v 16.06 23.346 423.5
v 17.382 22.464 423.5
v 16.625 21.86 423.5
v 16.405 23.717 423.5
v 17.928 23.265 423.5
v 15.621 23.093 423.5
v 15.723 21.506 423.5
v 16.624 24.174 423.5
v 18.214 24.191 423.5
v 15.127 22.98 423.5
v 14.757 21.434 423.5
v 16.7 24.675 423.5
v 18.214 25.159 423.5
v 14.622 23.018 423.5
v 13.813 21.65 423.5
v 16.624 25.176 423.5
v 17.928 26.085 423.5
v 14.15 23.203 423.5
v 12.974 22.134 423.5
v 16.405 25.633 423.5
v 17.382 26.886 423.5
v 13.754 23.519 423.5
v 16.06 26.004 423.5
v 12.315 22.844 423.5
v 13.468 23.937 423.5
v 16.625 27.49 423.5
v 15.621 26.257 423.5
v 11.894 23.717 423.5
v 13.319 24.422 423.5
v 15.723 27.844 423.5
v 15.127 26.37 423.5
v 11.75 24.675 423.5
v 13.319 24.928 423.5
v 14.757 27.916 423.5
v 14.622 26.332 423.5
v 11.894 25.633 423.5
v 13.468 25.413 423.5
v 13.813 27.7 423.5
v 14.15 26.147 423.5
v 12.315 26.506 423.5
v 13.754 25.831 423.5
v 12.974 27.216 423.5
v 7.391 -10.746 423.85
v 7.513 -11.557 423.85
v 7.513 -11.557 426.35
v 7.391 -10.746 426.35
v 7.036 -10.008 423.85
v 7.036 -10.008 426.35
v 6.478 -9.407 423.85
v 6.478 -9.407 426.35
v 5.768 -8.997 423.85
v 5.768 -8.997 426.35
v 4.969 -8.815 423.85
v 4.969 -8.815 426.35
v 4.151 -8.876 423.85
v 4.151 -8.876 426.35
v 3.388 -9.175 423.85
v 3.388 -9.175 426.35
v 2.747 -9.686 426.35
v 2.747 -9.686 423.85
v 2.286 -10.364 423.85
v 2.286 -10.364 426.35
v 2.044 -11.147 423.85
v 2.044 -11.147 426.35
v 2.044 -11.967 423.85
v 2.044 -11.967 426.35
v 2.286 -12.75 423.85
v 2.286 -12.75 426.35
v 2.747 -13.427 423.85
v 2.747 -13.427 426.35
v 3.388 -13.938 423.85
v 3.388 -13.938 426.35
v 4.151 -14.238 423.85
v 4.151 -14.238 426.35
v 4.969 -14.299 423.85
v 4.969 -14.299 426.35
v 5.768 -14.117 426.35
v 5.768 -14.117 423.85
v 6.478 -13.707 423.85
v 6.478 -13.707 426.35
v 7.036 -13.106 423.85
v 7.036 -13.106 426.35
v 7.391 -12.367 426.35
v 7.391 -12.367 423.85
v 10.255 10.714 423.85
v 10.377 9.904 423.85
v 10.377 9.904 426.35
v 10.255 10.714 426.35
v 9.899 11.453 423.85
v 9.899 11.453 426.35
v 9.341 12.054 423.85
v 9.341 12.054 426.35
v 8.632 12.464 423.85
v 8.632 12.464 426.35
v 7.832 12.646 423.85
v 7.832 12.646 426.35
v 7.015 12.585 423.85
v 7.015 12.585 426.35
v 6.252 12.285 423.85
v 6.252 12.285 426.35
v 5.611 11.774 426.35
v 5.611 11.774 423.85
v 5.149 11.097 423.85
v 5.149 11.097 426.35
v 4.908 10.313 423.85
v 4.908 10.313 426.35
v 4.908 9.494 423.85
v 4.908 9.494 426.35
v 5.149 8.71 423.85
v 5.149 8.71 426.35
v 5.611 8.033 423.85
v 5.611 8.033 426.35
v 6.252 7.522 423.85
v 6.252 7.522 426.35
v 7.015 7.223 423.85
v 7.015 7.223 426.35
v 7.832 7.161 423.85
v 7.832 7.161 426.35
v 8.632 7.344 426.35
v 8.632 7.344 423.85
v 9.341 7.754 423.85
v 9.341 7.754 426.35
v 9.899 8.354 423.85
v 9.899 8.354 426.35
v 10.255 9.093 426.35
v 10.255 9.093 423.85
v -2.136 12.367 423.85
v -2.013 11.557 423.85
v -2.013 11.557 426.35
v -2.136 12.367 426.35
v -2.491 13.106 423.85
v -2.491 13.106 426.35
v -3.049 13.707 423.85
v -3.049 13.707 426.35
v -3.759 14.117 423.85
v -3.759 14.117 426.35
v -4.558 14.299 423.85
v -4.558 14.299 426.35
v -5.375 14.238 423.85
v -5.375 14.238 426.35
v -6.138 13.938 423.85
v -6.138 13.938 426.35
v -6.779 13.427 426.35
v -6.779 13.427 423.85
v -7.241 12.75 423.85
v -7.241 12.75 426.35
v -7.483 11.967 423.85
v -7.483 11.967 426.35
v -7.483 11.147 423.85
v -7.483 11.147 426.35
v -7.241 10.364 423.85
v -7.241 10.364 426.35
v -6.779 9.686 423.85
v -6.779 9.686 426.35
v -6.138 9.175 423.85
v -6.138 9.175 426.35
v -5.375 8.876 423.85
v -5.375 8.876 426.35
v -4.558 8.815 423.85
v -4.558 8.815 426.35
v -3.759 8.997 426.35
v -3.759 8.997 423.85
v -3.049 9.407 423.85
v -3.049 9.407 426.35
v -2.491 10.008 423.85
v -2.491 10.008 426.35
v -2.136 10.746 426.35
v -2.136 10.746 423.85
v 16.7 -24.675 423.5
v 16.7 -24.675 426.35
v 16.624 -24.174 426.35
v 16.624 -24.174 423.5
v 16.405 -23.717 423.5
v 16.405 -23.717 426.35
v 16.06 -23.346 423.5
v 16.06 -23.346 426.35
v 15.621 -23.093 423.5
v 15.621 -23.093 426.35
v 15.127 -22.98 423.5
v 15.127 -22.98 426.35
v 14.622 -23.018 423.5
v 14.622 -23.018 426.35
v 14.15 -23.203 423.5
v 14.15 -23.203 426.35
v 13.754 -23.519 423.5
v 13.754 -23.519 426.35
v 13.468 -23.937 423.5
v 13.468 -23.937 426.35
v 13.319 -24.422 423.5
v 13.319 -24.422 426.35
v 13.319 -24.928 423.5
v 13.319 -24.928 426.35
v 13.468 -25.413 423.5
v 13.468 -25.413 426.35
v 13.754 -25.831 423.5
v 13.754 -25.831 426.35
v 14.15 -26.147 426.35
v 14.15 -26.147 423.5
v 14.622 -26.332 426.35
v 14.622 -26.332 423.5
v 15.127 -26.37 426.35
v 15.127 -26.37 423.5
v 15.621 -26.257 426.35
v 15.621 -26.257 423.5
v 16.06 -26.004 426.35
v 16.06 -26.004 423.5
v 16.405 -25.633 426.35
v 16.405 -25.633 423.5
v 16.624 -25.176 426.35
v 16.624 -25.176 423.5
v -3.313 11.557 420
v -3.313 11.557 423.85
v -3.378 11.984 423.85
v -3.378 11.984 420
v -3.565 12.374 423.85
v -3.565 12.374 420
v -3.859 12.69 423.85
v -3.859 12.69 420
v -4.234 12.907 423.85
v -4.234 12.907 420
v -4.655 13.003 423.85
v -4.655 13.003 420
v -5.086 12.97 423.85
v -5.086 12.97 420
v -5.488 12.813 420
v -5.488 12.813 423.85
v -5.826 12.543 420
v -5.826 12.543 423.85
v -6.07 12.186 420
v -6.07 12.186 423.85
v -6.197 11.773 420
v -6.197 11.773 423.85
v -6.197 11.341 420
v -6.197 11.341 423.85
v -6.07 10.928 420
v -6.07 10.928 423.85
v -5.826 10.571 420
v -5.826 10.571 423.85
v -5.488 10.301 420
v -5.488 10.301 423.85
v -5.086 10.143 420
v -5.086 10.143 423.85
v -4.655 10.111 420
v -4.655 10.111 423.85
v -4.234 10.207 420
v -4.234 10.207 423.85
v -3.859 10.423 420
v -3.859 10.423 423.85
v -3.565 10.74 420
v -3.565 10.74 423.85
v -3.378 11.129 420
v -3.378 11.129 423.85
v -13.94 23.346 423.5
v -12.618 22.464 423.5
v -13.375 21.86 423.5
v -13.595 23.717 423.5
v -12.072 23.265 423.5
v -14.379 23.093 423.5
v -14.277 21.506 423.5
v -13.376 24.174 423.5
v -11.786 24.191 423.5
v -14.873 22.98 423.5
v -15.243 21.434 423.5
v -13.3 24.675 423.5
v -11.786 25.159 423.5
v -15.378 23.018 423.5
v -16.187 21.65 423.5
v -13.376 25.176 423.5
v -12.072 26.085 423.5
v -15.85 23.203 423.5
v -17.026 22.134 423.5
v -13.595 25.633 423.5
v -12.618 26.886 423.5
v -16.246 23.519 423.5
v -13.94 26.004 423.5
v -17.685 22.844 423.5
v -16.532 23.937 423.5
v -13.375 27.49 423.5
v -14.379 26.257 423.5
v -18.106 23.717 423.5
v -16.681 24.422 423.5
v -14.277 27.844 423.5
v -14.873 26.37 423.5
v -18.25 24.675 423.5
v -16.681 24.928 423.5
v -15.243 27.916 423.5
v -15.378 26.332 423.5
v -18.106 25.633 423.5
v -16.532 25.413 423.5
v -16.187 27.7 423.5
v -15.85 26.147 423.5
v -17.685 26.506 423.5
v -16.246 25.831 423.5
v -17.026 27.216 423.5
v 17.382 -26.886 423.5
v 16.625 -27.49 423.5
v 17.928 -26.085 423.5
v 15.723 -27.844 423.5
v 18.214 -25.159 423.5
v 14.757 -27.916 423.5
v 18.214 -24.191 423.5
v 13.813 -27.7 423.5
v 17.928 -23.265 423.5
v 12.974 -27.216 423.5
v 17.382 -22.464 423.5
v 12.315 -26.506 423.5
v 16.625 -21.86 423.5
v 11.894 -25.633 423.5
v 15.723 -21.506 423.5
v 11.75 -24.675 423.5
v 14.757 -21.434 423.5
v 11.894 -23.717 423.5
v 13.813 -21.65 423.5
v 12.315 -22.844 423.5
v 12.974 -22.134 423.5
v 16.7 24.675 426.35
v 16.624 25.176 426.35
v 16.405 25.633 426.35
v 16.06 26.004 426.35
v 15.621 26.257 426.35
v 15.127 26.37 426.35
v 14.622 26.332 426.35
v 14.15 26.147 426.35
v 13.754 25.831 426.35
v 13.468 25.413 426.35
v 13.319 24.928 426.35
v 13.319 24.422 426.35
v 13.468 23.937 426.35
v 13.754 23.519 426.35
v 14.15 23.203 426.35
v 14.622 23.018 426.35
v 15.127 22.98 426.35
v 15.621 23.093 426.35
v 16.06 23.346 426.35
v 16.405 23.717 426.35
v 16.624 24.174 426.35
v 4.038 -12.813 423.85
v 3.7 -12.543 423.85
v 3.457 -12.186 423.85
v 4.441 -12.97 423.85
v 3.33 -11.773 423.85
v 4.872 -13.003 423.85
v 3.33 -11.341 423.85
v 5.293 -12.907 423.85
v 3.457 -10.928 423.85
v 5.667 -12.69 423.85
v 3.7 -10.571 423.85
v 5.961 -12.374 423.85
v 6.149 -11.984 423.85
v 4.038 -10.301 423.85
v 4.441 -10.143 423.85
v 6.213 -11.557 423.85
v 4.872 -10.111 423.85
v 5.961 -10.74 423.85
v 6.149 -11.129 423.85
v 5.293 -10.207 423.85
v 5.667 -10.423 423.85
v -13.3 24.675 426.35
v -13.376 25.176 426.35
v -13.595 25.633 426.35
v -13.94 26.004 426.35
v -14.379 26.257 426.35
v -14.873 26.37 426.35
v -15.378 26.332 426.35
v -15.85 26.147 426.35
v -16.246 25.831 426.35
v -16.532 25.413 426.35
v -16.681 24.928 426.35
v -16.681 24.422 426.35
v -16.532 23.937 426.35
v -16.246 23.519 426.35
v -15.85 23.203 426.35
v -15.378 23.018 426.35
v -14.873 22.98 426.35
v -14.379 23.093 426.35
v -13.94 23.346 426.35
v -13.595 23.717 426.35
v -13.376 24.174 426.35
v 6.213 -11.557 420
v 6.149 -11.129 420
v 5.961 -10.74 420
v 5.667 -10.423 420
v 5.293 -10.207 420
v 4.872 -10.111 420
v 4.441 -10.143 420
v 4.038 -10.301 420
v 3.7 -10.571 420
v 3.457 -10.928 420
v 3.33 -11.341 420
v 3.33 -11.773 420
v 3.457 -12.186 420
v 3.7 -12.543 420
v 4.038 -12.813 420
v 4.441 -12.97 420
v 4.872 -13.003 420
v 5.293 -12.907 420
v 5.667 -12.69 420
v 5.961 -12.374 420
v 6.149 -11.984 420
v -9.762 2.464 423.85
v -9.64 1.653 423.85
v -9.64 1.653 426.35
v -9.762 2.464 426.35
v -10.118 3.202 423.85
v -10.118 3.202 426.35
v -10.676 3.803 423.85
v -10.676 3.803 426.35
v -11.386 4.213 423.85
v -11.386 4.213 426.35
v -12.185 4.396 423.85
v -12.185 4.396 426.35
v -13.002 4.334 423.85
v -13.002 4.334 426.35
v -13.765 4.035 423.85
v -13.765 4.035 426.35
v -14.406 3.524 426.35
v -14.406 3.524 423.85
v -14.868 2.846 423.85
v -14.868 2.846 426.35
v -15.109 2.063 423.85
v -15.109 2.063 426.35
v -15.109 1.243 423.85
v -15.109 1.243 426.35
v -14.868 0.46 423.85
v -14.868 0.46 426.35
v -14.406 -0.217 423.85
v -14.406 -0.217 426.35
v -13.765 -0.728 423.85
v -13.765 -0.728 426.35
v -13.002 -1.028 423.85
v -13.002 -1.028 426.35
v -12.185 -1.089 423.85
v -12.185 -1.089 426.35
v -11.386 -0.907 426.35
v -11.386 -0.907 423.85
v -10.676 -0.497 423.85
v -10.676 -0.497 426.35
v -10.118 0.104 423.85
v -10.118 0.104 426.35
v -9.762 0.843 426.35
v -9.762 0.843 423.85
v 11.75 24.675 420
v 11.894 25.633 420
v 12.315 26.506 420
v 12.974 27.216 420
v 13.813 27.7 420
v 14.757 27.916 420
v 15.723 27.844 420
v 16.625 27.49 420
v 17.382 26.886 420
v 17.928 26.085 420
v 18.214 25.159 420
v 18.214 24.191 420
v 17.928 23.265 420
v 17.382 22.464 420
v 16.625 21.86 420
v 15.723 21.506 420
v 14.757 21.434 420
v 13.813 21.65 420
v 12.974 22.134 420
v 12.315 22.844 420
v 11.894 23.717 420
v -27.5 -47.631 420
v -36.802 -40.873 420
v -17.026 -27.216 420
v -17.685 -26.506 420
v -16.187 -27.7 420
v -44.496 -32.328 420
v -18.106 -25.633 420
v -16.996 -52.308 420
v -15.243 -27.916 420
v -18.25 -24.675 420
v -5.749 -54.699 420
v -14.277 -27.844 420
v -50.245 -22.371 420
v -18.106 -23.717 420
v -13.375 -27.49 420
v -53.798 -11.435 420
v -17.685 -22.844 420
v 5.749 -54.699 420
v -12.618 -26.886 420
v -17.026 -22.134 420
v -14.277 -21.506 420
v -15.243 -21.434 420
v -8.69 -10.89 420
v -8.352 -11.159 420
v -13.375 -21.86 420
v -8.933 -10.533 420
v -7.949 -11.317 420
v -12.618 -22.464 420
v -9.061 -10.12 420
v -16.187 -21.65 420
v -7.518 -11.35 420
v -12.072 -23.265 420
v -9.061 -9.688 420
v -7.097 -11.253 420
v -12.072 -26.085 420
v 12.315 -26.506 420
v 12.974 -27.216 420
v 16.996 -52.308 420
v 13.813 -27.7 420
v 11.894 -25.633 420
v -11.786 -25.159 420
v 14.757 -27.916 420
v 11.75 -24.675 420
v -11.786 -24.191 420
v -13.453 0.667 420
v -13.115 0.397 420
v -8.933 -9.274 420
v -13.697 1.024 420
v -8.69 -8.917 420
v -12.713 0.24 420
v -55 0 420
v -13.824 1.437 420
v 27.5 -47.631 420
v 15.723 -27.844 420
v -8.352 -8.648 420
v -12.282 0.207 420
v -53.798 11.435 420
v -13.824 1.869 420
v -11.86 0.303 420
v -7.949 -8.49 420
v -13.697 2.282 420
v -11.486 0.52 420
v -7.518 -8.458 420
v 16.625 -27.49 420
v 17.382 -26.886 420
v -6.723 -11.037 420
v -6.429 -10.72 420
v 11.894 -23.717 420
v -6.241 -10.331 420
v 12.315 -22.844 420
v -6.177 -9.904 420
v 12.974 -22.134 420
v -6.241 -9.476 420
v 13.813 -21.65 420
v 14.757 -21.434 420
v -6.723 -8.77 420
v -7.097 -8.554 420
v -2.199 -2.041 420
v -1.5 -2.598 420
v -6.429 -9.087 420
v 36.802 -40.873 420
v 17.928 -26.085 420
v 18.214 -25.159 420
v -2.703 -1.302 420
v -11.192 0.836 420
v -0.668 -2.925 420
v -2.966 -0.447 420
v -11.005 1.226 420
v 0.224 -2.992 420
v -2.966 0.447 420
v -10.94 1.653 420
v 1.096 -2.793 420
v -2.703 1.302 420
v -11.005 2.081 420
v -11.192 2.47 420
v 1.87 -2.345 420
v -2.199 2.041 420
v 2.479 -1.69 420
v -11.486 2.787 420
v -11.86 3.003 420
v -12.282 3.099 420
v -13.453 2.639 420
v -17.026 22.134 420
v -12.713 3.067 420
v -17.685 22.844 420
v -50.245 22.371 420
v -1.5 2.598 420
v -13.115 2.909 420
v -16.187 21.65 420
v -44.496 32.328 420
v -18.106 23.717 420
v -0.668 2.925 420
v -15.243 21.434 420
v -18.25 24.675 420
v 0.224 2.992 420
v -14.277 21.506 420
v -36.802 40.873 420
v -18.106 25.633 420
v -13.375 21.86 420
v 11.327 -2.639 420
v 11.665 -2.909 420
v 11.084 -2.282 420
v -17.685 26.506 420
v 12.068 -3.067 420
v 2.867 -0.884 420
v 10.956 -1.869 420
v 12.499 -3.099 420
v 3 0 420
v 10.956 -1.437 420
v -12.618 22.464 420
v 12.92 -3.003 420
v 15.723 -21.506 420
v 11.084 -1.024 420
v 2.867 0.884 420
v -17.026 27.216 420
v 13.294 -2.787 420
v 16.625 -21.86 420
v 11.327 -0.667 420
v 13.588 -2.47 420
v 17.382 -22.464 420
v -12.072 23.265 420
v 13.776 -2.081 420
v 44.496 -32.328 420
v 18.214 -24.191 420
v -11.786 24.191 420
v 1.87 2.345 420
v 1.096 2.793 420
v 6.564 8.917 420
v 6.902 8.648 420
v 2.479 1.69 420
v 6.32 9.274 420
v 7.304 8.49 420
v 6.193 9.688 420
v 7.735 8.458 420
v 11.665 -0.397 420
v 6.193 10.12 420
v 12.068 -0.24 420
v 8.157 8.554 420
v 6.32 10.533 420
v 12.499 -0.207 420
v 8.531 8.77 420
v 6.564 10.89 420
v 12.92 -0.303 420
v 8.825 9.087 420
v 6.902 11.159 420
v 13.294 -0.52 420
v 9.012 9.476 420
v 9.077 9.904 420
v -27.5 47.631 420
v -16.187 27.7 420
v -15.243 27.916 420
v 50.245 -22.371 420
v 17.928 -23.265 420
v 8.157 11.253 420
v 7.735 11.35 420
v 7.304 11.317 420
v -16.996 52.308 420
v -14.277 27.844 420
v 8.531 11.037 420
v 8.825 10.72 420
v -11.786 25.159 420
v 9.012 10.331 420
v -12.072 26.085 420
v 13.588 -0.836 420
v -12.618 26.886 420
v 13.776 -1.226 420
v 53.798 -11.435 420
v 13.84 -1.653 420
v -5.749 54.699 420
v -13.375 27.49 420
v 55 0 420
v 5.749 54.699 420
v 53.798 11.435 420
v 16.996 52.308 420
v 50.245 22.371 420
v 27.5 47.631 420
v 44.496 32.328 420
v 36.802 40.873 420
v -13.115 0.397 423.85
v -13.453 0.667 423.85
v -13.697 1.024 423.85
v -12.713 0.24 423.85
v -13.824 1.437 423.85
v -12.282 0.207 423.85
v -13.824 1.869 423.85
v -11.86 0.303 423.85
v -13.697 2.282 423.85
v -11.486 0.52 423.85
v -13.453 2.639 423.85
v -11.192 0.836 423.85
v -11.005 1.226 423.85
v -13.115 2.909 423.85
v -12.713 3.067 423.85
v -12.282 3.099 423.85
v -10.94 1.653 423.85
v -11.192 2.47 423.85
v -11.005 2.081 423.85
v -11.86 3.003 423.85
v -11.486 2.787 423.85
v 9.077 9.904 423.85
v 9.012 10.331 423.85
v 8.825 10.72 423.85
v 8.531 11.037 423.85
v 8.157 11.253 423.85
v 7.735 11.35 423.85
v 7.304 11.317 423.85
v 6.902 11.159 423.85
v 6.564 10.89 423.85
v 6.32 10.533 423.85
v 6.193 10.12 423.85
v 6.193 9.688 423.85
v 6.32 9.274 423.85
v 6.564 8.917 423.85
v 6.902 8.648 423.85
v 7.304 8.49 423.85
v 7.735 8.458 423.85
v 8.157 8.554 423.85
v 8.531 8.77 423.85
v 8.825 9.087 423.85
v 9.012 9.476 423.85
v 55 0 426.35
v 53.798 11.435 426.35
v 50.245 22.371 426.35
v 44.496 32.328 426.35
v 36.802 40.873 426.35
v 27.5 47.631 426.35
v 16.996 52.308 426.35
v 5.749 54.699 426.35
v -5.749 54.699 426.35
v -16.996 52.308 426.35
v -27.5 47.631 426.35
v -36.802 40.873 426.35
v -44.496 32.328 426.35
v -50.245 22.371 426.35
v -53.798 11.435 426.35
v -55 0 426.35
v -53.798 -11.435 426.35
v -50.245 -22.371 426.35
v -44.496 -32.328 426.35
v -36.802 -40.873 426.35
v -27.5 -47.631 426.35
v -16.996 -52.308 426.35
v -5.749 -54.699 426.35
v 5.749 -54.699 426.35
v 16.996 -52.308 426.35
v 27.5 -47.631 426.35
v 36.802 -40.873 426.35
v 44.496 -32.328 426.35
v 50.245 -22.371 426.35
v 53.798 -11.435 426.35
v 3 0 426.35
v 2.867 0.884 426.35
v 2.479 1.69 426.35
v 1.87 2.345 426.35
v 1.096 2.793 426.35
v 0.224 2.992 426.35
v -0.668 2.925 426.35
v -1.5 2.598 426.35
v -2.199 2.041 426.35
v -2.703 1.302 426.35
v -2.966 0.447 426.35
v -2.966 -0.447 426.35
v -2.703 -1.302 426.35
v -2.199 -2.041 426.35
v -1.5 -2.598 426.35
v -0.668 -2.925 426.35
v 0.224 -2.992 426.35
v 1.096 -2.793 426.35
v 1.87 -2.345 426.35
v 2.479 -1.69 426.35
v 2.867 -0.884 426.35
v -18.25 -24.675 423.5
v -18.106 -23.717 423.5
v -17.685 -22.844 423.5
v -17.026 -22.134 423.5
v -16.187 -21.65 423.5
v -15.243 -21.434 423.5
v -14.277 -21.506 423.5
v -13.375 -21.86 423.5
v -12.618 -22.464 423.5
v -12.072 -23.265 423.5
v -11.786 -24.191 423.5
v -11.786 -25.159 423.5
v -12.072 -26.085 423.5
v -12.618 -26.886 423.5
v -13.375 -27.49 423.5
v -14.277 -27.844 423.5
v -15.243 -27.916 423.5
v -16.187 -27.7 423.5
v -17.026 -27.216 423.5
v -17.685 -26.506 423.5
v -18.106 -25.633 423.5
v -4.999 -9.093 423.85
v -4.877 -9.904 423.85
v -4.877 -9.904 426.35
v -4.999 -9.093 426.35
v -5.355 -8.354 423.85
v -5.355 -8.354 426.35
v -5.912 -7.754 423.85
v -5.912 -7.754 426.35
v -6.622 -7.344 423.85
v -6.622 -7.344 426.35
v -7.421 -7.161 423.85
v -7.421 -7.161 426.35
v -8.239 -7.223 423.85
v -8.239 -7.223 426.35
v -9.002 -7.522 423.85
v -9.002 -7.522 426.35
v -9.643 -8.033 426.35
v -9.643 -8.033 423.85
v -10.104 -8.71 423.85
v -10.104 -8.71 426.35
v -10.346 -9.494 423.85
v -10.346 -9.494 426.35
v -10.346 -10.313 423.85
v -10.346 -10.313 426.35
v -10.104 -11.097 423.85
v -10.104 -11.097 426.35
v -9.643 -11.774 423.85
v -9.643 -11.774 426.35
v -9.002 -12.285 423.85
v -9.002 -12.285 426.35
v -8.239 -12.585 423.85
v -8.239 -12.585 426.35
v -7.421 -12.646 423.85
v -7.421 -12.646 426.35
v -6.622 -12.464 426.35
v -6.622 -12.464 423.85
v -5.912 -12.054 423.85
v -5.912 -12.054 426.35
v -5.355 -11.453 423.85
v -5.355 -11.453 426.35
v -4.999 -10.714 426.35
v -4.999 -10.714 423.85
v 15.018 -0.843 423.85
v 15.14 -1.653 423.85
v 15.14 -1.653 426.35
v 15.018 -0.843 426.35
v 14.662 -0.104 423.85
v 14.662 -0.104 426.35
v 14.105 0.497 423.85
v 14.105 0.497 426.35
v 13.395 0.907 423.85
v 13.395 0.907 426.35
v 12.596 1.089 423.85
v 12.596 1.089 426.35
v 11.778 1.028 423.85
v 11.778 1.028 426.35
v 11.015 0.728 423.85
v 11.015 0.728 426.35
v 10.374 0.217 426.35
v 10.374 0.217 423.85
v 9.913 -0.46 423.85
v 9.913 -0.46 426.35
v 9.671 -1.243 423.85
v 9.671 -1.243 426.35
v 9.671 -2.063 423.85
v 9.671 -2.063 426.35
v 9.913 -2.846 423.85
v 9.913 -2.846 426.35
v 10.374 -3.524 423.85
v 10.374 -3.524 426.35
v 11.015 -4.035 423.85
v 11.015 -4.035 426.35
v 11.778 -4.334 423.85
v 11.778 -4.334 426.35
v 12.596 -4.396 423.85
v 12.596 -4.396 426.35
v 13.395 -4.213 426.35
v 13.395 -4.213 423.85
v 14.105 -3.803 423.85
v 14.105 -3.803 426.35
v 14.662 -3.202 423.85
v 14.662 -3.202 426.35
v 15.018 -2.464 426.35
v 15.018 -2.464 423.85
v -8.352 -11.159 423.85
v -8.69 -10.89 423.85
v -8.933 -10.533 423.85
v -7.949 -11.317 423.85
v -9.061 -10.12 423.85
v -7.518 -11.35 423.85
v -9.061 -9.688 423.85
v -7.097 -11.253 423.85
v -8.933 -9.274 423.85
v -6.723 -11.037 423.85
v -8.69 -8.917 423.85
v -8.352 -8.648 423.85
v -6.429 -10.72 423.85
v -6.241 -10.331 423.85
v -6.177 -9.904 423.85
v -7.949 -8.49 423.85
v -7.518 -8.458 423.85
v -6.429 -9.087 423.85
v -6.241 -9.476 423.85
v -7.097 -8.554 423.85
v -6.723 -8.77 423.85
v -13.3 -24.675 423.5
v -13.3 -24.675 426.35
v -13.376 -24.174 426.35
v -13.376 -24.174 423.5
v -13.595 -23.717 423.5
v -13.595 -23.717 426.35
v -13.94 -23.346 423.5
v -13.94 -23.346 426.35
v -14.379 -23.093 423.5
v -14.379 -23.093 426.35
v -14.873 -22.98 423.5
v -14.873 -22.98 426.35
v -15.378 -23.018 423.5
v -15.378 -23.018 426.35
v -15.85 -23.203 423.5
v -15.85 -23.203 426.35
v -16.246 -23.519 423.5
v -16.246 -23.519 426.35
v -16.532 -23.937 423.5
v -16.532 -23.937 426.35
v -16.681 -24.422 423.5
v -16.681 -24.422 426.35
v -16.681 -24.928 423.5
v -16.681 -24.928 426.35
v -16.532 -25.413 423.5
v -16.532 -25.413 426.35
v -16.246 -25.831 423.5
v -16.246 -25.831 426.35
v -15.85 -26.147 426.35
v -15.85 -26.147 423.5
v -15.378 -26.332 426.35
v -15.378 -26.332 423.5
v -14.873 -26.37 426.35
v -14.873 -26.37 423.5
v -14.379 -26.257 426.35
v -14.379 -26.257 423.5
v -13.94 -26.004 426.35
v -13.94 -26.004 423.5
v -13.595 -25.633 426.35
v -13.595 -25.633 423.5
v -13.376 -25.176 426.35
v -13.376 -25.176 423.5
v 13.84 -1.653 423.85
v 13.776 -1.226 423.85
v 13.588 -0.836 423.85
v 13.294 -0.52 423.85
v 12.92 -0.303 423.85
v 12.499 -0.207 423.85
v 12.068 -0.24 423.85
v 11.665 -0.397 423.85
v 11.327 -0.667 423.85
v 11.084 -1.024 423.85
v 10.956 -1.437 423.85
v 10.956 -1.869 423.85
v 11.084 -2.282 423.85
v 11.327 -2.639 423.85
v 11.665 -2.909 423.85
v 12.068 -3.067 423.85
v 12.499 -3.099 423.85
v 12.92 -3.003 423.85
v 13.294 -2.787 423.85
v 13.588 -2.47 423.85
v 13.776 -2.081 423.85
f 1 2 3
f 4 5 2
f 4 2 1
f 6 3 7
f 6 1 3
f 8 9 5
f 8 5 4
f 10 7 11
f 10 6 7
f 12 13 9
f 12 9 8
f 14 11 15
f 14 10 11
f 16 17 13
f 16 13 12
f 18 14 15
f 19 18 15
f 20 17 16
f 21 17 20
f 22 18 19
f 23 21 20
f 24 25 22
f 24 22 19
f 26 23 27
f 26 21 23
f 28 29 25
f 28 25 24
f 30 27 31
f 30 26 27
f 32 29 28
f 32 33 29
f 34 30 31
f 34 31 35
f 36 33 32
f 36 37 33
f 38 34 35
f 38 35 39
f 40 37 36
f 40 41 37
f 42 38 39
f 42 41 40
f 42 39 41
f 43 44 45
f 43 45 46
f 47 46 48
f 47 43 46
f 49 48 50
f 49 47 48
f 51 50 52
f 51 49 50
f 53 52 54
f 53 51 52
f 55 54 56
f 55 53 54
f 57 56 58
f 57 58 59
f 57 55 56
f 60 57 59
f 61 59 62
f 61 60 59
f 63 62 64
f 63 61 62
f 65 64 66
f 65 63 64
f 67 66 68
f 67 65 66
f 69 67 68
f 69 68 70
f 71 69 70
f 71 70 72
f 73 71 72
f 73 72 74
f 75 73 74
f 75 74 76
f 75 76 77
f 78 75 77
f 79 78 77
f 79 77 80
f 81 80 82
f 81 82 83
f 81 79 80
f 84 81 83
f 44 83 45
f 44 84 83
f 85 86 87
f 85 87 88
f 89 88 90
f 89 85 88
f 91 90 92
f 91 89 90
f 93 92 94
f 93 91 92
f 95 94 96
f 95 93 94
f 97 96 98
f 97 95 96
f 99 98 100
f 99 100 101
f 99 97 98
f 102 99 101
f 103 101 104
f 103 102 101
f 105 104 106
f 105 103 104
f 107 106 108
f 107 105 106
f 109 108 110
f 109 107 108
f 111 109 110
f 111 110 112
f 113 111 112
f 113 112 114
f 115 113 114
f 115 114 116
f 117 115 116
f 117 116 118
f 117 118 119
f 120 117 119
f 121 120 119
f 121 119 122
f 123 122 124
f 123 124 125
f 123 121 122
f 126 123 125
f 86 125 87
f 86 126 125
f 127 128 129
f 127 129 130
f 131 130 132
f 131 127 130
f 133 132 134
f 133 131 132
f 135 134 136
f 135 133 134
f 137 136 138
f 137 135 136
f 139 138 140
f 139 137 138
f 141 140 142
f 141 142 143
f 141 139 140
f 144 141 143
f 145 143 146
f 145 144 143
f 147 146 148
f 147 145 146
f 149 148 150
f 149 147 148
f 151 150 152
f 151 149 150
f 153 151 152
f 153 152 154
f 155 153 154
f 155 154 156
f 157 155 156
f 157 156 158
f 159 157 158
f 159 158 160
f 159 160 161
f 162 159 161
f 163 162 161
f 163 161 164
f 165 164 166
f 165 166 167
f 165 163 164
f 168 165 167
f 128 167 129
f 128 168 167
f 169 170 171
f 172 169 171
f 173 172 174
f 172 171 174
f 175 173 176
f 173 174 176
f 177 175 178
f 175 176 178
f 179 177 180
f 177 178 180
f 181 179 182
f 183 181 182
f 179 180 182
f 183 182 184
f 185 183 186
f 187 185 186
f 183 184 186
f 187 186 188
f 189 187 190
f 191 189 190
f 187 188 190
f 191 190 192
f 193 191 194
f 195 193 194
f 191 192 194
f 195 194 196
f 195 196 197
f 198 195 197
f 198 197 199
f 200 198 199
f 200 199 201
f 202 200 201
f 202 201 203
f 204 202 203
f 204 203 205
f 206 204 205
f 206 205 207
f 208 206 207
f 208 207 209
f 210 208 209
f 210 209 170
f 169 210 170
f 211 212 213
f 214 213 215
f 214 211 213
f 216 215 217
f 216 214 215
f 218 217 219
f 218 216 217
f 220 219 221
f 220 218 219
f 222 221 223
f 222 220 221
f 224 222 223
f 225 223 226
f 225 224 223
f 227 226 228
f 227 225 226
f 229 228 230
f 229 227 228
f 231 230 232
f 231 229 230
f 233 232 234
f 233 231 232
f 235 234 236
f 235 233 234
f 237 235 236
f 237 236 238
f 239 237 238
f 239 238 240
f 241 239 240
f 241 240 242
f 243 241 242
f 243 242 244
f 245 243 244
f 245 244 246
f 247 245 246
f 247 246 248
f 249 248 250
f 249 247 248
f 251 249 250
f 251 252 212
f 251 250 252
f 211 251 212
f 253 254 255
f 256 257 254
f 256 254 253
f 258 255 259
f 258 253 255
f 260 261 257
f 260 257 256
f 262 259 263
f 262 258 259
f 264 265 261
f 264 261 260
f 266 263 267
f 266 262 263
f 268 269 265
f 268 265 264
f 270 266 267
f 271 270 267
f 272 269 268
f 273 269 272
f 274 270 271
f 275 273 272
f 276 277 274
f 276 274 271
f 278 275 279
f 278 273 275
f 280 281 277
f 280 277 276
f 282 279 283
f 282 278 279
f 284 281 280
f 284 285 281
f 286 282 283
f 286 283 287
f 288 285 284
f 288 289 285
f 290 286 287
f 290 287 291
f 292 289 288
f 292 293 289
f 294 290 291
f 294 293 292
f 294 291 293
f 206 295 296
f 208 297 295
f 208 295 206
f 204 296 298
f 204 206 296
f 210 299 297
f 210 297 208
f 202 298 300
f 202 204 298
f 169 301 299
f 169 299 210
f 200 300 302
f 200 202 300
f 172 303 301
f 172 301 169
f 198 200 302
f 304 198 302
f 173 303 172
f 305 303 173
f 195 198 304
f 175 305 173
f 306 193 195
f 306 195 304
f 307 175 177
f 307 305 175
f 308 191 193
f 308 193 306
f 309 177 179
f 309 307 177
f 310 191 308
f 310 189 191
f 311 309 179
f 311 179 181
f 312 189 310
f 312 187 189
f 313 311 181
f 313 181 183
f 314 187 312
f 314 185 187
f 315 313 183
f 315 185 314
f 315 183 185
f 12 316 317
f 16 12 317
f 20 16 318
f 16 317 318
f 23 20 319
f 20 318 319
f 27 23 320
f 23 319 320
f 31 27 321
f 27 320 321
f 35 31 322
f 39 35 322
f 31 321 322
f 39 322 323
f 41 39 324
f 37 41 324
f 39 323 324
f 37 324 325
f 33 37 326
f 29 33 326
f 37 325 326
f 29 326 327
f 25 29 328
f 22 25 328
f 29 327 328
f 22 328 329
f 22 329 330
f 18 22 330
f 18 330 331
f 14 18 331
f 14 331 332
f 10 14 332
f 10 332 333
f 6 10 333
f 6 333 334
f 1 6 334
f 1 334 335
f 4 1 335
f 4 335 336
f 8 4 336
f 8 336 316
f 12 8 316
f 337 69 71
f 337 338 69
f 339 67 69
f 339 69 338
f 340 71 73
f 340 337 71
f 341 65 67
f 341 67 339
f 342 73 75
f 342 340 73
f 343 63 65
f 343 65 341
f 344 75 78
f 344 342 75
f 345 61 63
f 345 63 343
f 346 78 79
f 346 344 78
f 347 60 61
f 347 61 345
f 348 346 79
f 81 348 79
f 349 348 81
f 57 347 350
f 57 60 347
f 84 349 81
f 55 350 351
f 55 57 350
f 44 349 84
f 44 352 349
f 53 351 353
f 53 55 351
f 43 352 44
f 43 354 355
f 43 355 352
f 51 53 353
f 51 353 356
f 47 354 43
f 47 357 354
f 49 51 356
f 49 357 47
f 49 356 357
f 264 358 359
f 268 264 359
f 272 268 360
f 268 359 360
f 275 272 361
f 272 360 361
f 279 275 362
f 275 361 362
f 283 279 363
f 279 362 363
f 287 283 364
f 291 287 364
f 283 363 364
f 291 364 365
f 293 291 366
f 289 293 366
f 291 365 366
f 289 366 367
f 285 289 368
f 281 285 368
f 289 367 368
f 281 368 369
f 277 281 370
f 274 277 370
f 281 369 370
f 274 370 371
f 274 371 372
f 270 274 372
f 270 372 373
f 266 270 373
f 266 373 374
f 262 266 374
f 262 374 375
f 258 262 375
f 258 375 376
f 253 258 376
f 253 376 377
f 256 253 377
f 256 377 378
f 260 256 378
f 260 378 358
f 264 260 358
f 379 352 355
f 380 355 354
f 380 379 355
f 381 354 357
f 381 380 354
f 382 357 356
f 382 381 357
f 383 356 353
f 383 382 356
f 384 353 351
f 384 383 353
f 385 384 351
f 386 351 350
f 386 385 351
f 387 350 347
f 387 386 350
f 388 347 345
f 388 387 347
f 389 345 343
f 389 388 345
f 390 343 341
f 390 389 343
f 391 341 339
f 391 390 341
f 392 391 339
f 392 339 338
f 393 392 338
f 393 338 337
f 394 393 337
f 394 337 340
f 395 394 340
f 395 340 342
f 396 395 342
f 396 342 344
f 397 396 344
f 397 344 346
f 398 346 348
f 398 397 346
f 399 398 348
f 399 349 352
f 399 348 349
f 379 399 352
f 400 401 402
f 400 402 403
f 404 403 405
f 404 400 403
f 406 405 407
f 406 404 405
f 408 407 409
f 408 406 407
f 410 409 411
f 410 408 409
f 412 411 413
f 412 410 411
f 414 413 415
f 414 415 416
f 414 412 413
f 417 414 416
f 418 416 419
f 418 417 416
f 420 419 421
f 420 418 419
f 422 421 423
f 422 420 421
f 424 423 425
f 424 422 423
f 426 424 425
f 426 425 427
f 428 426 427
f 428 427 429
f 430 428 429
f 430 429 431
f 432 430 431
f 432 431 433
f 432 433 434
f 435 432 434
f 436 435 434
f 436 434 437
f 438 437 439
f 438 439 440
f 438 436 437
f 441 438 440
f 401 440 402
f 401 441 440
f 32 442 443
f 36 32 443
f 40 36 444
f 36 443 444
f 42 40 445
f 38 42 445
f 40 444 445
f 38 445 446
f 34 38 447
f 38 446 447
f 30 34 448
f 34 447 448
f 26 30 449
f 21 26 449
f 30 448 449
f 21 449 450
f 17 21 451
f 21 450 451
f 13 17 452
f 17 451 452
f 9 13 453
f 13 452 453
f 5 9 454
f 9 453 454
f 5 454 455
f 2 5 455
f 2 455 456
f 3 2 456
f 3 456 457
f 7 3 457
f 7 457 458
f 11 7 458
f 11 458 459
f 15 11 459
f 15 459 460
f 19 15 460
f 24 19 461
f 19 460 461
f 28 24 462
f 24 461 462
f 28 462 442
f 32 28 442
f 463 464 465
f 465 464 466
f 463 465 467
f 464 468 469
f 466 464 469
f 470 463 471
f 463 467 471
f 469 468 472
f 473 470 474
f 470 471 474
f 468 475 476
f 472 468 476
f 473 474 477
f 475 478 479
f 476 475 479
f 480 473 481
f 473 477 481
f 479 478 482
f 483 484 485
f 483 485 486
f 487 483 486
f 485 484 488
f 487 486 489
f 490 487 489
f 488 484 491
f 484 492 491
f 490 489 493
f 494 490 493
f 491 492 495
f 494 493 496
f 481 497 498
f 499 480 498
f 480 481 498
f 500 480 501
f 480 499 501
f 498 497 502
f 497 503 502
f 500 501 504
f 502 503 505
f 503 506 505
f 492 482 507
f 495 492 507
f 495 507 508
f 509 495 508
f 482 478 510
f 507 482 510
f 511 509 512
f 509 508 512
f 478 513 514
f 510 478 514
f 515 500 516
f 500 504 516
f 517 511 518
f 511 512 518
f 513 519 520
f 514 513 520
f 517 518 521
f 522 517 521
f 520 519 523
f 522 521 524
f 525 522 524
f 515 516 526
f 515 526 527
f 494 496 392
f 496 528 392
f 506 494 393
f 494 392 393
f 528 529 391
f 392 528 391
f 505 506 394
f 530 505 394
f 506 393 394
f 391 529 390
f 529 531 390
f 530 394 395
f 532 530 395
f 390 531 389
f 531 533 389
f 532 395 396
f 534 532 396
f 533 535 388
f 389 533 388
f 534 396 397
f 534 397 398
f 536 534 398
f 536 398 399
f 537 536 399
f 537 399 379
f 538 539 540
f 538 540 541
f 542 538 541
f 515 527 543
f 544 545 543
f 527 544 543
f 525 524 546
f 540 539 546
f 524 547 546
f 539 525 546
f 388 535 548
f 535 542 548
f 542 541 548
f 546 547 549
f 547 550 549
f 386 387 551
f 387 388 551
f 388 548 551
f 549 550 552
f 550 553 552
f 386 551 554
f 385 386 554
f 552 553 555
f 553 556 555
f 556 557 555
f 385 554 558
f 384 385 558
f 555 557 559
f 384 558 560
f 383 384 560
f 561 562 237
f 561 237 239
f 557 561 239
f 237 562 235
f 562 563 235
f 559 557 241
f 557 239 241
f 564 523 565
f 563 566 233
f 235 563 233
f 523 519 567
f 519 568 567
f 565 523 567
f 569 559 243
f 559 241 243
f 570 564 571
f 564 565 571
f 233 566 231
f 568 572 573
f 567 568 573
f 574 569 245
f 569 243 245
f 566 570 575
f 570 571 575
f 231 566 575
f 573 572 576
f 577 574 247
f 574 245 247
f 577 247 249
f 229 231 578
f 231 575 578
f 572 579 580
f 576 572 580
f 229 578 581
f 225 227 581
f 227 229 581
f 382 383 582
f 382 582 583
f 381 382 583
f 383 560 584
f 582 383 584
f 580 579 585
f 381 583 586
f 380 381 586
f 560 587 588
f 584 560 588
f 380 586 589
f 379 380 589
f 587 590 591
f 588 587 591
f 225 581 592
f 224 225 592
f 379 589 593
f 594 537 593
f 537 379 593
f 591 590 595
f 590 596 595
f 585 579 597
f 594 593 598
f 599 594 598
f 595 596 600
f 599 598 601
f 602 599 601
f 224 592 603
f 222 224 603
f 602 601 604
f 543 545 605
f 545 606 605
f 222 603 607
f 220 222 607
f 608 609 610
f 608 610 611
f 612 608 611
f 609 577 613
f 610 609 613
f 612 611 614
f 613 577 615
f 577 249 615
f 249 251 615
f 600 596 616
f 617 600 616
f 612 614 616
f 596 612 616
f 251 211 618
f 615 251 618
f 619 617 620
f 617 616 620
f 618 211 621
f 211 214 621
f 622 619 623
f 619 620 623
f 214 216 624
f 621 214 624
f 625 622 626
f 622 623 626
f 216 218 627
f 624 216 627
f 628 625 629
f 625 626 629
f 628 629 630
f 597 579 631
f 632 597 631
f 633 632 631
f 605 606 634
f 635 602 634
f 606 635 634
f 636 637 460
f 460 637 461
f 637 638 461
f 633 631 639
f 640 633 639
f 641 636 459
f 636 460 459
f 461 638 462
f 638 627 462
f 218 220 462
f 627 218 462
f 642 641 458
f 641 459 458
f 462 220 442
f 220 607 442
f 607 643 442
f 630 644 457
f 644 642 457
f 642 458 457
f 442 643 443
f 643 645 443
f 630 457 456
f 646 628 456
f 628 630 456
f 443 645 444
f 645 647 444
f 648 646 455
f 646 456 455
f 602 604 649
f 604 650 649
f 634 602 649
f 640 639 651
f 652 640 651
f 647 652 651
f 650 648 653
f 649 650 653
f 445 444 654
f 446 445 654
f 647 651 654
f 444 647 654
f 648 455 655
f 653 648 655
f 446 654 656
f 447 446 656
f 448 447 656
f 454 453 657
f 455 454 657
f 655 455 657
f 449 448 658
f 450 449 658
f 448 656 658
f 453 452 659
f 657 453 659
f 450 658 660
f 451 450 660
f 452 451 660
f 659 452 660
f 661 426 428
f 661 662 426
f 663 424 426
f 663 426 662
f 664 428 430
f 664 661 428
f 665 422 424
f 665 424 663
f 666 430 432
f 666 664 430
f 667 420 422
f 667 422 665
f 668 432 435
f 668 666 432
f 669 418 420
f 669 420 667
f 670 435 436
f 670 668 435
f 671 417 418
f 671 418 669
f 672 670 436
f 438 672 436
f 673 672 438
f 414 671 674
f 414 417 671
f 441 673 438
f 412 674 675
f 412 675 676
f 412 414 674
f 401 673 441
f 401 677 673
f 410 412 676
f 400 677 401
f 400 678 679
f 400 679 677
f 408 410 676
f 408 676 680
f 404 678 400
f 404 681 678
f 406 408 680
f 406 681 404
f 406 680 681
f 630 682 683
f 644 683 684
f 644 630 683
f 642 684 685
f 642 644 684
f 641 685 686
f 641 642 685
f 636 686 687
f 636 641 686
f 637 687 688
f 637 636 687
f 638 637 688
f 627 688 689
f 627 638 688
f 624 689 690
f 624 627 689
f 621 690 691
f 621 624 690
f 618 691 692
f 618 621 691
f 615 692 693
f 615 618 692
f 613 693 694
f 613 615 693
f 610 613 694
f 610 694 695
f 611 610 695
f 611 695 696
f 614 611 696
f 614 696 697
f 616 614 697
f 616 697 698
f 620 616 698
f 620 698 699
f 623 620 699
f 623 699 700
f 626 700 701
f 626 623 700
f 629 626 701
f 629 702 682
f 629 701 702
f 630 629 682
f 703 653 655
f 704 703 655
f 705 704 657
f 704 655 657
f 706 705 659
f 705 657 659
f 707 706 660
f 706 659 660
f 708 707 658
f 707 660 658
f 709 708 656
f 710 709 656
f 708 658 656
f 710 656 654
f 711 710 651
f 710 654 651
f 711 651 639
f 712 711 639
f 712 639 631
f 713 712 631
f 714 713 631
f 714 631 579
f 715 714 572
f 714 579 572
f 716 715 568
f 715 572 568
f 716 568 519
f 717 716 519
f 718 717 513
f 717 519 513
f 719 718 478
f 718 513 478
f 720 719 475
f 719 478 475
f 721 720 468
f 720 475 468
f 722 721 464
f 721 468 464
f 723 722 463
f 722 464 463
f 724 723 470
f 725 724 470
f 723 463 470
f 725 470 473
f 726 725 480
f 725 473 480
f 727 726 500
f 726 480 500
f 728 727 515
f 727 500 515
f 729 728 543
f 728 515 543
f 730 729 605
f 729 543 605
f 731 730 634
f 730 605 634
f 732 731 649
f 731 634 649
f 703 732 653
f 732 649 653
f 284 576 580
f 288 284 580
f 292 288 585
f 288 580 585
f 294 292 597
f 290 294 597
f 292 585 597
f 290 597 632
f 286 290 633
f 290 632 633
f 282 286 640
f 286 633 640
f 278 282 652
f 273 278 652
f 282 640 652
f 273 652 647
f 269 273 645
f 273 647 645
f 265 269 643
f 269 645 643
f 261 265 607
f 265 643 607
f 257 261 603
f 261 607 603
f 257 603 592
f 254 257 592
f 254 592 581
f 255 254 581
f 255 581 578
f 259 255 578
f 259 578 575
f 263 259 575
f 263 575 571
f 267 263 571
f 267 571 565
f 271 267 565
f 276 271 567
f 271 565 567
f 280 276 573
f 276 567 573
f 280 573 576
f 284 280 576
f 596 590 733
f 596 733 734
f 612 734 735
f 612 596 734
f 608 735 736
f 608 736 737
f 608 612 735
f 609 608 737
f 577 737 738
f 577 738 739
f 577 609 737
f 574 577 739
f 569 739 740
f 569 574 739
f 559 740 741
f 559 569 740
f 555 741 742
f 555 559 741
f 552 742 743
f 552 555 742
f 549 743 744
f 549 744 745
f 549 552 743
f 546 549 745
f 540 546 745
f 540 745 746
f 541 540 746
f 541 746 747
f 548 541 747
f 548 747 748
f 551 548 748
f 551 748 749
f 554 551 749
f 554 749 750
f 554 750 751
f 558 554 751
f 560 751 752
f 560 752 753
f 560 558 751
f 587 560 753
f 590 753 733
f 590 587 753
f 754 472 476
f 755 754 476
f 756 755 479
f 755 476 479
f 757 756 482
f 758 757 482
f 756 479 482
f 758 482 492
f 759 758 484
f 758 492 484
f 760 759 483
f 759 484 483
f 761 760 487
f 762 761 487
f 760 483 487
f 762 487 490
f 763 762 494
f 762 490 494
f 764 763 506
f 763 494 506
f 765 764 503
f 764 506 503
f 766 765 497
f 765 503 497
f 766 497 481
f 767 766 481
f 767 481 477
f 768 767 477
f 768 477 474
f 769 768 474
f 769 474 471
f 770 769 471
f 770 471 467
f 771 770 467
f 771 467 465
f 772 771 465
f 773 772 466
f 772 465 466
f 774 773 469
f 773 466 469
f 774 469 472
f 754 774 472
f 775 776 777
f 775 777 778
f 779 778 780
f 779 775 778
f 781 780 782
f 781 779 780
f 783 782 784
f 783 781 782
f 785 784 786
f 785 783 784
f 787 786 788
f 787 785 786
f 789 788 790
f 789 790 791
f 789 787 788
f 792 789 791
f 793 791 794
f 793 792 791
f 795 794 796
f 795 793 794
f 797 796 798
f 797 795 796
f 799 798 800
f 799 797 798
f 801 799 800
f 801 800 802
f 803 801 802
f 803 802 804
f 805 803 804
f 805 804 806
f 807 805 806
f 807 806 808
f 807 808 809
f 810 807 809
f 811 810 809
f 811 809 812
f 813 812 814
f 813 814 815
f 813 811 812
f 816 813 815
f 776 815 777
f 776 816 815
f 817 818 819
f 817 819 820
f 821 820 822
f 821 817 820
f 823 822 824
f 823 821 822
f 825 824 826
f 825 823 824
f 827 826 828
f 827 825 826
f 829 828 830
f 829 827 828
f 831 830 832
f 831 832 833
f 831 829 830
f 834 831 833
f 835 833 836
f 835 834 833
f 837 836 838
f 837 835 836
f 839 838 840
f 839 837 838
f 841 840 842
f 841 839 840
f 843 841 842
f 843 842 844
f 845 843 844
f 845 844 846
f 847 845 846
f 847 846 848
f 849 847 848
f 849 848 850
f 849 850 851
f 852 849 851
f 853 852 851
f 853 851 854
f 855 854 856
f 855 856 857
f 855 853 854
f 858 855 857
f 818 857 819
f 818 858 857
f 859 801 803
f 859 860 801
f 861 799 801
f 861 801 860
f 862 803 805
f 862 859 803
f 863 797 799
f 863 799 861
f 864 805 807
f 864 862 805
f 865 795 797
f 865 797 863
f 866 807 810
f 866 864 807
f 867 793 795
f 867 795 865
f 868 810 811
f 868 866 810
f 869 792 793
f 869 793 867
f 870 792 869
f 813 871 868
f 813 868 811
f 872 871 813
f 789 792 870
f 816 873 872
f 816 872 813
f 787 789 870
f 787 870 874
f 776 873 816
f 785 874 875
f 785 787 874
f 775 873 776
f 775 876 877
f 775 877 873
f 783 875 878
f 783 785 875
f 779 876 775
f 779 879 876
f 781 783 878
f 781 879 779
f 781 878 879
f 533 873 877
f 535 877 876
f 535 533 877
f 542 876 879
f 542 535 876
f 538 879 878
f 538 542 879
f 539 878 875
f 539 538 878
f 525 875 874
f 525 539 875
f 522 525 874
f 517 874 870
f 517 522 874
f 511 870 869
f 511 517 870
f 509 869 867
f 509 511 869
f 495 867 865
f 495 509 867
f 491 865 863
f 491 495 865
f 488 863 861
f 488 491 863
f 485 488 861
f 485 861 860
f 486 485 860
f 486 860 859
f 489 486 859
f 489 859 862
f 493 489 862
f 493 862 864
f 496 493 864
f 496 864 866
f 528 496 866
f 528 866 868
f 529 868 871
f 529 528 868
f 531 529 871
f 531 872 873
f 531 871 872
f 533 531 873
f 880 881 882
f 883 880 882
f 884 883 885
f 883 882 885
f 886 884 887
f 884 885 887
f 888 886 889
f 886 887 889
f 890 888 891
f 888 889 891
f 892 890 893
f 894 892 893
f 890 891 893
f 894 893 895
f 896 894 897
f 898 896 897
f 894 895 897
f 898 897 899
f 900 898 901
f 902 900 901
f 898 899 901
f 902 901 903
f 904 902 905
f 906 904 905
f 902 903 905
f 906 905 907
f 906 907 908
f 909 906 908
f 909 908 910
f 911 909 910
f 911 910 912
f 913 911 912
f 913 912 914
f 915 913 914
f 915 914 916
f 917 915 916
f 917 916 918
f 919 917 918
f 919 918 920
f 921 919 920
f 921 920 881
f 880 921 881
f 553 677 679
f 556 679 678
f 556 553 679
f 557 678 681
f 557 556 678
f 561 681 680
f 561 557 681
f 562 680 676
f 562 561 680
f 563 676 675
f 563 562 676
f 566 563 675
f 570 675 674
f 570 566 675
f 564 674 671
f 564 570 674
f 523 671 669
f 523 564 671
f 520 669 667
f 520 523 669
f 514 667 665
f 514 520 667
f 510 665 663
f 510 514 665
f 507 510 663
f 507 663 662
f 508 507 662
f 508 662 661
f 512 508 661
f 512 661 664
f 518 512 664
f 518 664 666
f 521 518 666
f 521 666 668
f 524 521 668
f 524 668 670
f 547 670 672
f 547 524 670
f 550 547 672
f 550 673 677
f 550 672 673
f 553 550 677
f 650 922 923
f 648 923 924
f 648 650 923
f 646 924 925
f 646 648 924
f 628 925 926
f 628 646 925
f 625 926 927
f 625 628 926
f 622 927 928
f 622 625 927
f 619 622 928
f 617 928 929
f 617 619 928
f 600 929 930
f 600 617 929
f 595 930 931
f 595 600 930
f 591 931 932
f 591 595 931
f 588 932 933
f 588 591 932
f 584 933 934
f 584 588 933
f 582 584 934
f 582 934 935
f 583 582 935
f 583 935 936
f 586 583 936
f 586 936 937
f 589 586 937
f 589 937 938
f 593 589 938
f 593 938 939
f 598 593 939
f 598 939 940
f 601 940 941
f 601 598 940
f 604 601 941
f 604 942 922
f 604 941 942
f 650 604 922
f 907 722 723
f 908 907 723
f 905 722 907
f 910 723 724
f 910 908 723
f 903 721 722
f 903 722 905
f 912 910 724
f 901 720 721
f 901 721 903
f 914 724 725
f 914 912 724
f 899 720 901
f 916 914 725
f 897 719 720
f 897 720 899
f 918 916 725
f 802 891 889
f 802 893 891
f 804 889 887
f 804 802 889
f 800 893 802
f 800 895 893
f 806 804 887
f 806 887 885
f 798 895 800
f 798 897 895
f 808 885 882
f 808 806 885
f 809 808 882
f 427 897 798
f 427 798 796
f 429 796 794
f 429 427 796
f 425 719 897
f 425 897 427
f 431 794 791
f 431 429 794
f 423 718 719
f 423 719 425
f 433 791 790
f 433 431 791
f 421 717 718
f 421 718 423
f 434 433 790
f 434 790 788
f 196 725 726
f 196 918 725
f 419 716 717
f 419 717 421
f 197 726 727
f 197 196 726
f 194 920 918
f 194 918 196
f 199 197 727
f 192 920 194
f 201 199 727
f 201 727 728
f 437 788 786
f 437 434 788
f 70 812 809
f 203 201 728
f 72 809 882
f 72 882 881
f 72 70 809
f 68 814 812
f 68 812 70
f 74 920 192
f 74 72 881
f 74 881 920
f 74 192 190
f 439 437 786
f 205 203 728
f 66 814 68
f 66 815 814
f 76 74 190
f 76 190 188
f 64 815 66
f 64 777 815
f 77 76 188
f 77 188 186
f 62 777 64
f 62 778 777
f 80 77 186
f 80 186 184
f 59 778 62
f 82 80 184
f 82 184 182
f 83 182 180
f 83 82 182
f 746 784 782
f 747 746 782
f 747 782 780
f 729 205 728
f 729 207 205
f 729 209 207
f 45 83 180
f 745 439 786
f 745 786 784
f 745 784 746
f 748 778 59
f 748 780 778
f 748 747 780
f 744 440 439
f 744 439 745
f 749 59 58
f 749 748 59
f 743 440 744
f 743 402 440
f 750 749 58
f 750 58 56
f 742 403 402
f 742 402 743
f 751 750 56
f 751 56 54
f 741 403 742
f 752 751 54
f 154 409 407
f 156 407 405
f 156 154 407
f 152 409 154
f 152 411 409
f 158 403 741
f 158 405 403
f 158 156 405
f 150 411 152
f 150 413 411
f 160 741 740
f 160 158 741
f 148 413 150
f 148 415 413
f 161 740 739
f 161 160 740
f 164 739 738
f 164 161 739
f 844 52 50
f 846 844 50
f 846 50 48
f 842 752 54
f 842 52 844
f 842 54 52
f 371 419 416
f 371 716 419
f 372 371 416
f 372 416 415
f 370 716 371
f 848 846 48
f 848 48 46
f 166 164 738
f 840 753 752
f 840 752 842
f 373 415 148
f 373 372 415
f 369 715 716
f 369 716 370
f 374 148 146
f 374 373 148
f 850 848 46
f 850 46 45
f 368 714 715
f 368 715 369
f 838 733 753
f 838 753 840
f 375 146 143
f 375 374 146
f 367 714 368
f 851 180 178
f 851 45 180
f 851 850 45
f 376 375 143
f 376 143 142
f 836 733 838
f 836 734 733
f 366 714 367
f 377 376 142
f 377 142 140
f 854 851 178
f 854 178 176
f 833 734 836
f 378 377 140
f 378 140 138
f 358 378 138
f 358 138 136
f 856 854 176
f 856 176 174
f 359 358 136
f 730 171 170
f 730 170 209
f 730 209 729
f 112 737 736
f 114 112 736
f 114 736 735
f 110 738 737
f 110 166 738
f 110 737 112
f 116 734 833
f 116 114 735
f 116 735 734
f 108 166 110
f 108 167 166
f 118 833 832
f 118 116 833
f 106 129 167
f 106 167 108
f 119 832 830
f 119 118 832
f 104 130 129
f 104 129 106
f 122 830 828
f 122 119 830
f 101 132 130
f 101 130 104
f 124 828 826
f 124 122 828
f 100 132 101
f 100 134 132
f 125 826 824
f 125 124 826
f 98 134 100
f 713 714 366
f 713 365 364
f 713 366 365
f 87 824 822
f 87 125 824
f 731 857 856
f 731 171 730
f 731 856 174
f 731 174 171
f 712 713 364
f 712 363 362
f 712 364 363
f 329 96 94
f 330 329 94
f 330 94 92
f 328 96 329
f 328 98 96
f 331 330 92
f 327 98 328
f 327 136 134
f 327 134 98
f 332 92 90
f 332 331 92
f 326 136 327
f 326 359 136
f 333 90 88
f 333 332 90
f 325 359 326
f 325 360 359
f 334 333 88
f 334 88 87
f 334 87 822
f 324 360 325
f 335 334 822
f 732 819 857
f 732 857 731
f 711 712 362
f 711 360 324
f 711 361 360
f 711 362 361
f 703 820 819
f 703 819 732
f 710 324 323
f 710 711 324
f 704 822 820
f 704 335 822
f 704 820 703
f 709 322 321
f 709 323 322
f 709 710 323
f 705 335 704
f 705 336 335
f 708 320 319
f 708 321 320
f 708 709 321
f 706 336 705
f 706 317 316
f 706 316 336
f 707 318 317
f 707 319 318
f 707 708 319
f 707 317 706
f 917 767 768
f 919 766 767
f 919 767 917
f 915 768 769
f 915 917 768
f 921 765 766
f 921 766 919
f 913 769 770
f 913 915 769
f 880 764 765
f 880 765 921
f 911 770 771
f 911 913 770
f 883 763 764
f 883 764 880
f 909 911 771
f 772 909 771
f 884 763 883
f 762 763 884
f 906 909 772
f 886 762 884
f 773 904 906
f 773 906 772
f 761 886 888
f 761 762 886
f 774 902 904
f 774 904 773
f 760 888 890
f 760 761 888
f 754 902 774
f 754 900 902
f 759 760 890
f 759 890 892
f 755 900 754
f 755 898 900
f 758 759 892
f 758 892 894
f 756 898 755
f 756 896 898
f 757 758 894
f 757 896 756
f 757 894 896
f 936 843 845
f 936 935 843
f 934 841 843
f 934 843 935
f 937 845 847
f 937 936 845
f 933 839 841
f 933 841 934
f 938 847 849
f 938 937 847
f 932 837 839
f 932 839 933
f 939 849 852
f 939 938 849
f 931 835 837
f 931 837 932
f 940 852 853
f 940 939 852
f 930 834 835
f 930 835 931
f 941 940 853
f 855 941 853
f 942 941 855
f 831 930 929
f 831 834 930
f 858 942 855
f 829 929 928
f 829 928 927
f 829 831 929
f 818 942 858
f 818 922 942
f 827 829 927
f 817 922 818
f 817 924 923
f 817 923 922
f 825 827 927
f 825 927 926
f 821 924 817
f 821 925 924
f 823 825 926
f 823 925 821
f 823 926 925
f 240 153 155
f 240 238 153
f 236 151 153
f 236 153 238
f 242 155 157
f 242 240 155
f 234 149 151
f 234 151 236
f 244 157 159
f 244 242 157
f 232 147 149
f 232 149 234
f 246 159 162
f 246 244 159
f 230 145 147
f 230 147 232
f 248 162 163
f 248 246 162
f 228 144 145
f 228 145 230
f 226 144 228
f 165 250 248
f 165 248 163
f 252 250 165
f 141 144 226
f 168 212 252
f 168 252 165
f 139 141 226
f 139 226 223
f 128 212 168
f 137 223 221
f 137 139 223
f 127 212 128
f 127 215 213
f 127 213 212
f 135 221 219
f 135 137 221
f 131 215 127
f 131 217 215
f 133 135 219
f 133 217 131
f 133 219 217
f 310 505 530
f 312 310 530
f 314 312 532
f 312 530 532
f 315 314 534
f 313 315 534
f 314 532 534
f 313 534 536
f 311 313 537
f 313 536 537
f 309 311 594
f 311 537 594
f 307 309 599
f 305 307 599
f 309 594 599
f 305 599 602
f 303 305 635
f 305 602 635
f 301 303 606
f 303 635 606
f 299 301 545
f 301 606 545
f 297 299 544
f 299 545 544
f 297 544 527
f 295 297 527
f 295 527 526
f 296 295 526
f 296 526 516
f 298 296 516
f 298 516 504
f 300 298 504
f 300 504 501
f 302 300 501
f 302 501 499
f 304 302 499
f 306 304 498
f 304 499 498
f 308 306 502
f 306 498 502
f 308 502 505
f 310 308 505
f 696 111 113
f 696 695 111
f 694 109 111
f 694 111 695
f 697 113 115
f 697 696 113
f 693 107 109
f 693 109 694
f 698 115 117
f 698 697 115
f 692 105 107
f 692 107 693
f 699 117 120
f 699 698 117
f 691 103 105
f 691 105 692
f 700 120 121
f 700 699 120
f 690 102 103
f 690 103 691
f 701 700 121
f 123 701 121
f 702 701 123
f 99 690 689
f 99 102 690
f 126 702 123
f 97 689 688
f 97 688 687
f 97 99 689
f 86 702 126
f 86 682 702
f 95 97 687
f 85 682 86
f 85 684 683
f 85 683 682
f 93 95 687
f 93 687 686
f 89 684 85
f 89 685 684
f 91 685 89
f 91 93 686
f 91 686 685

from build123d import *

# Parameters (mm, degrees)
DISCO_START                  = 420
SK_DISCO_R                   = 55
DISCO_DEPTH                  = 6.35
PASANTES_M2_5_ROTOR_J4_START = 420
SK_PASANTES_M2_5_ROTOR_J4_R  = 1.45
PASANTES_M2_5_ROTOR_J4_DEPTH = 6.35
CAJAS_M2_5_START             = 423.85
SK_CAJAS_M2_5_R              = 2.75
CAJAS_M2_5_DEPTH             = 2.5
PASO_CABLE_START             = 420
SK_PASO_CABLE_R              = 3
PASO_CABLE_DEPTH             = 6.35
SK_PASANTES_M3_PAREDES_R     = 1.7
PASANTES_M3_PAREDES_DEPTH    = 79.040518322
SK_CAJAS_M3_PAREDES_R        = 3.25
CAJAS_M3_PAREDES_DEPTH       = 3.5


with BuildPart() as part:
    # Sk_Disco → Disco (new body)
    with BuildSketch(Plane.XY.offset(DISCO_START)):
        Circle(SK_DISCO_R)
    extrude(amount=DISCO_DEPTH)

    # Sk_Pasantes_M2-5_rotor_J4 → Pasantes_M2-5_rotor_J4 (cut)
    with BuildSketch(Plane.XY.offset(PASANTES_M2_5_ROTOR_J4_START)):
        with Locations((12.390194253, -1.653204878)):
            Circle(SK_PASANTES_M2_5_ROTOR_J4_R)
        with Locations((7.626814549, 9.903620542)):
            Circle(SK_PASANTES_M2_5_ROTOR_J4_R)
        with Locations((-4.763379704, 11.55682542)):
            Circle(SK_PASANTES_M2_5_ROTOR_J4_R)
        with Locations((-12.390194253, 1.653204878)):
            Circle(SK_PASANTES_M2_5_ROTOR_J4_R)
        with Locations((-7.626814549, -9.903620542)):
            Circle(SK_PASANTES_M2_5_ROTOR_J4_R)
        with Locations((4.763379704, -11.55682542)):
            Circle(SK_PASANTES_M2_5_ROTOR_J4_R)
    extrude(amount=PASANTES_M2_5_ROTOR_J4_DEPTH, mode=Mode.SUBTRACT)

    # Sk_Cajas_M2-5 → Cajas_M2-5 (cut)
    with BuildSketch(Plane.XY.offset(CAJAS_M2_5_START)):
        with Locations((12.390194253, -1.653204878)):
            Circle(SK_CAJAS_M2_5_R)
        with Locations((7.626814549, 9.903620542)):
            Circle(SK_CAJAS_M2_5_R)
        with Locations((-4.763379704, 11.55682542)):
            Circle(SK_CAJAS_M2_5_R)
        with Locations((-12.390194253, 1.653204878)):
            Circle(SK_CAJAS_M2_5_R)
        with Locations((-7.626814549, -9.903620542)):
            Circle(SK_CAJAS_M2_5_R)
        with Locations((4.763379704, -11.55682542)):
            Circle(SK_CAJAS_M2_5_R)
    extrude(amount=CAJAS_M2_5_DEPTH, mode=Mode.SUBTRACT)

    # Sk_Paso_cable → Paso_cable (cut)
    with BuildSketch(Plane.XY.offset(PASO_CABLE_START)):
        Circle(SK_PASO_CABLE_R)
    extrude(amount=PASO_CABLE_DEPTH, mode=Mode.SUBTRACT)

    # Sk_Pasantes_M3_paredes → Pasantes_M3_paredes (cut, through all)
    with BuildSketch(Plane.XY.offset(426.35)):
        with Locations((-15, -24.675)):
            Circle(SK_PASANTES_M3_PAREDES_R)
        with Locations((15, -24.675)):
            Circle(SK_PASANTES_M3_PAREDES_R)
        with Locations((-15, 24.675)):
            Circle(SK_PASANTES_M3_PAREDES_R)
        with Locations((15, 24.675)):
            Circle(SK_PASANTES_M3_PAREDES_R)
    extrude(amount=-PASANTES_M3_PAREDES_DEPTH, mode=Mode.SUBTRACT)

    # Sk_Cajas_M3_paredes → Cajas_M3_paredes (cut)
    with BuildSketch(Plane(origin=(0, 0, 420), x_dir=(-1, 0, 0), z_dir=(0, 0, -1))):
        with Locations((15, -24.675)):
            Circle(SK_CAJAS_M3_PAREDES_R)
        with Locations((-15, -24.675)):
            Circle(SK_CAJAS_M3_PAREDES_R)
        with Locations((15, 24.675)):
            Circle(SK_CAJAS_M3_PAREDES_R)
        with Locations((-15, 24.675)):
            Circle(SK_CAJAS_M3_PAREDES_R)
    extrude(amount=-CAJAS_M3_PAREDES_DEPTH, mode=Mode.SUBTRACT)


solid = part.part
